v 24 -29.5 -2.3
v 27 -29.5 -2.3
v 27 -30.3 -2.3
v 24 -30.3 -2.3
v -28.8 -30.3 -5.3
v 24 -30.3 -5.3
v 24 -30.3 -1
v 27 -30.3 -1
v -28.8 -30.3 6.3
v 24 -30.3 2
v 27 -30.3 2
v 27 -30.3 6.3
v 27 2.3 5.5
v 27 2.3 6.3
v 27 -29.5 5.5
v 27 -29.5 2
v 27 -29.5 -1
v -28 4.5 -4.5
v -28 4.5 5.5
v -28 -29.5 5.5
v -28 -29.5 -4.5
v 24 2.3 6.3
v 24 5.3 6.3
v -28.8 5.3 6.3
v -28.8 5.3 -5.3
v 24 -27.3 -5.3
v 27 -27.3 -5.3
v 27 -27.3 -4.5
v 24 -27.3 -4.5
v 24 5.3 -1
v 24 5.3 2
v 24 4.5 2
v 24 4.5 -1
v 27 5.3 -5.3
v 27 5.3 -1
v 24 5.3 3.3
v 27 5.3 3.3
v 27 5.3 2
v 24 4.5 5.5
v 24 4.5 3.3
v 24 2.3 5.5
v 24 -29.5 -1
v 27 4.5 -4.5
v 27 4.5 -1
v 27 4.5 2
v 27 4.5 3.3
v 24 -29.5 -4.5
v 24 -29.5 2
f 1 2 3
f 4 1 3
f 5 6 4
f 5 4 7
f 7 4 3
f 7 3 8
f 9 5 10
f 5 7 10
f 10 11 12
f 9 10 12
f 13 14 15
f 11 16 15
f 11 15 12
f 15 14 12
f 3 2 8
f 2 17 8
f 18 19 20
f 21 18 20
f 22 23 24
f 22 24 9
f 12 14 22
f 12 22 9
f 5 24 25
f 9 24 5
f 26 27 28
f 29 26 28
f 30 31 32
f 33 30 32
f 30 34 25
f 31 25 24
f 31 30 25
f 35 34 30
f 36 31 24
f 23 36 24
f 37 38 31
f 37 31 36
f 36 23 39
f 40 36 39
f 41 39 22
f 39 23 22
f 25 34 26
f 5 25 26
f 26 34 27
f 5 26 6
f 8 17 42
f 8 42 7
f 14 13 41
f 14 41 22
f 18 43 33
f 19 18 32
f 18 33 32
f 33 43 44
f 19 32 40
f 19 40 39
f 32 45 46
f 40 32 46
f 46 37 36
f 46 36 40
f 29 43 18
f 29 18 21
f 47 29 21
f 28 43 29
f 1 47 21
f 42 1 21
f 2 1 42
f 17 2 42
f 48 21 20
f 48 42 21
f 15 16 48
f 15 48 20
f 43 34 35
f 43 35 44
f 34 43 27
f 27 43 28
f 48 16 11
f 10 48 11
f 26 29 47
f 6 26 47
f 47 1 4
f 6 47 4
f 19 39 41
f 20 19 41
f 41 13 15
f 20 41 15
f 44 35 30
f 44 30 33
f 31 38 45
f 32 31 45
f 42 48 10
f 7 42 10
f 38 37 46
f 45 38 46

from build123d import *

# Parameters (mm, degrees)
SKETCH006_W             = 35.6
SKETCH006_H             = 11.6
PAD006_DEPTH            = 55.8
SKETCH007_W             = 34
SKETCH007_H             = 10
POCKET_DEPTH            = 55
SKETCH008_W             = 3
SKETCH008_H             = 3
POCKET001_DEPTH         = 3
BODY001_PLACEMENT_ANGLE = 90


with BuildPart() as part:
    # Sketch006 → Pad006 (new body)
    with BuildSketch(Plane.XZ):
        Rectangle(SKETCH006_W, SKETCH006_H)
    extrude(amount=PAD006_DEPTH)

    # Sketch007 → Pocket (cut)
    with BuildSketch(Plane.XZ):
        Rectangle(SKETCH007_W, SKETCH007_H)
    extrude(amount=POCKET_DEPTH, mode=Mode.SUBTRACT)

    # Sketch008 → Pocket001 (cut)
    with BuildSketch(Plane.XZ):
        with Locations((-16.3, 4.3)):
            Rectangle(SKETCH008_W, SKETCH008_H)
        with Locations((16.3, -4.3)):
            Rectangle(SKETCH008_W, SKETCH008_H)
        with Locations((-16.3, 0)):
            Rectangle(SKETCH008_W, SKETCH008_H)
        with Locations((16.3, 0)):
            Rectangle(SKETCH008_W, SKETCH008_H)
    extrude(amount=POCKET001_DEPTH, mode=Mode.SUBTRACT)


with BuildPart() as part_1:
    # Body001 placement: moved
    add(part.part.moved(Location((27, -12.5, 0.5))).rotate(Axis((27, -12.5, 0.5), (0, 0, -1)), BODY001_PLACEMENT_ANGLE))


solid = part_1.part
